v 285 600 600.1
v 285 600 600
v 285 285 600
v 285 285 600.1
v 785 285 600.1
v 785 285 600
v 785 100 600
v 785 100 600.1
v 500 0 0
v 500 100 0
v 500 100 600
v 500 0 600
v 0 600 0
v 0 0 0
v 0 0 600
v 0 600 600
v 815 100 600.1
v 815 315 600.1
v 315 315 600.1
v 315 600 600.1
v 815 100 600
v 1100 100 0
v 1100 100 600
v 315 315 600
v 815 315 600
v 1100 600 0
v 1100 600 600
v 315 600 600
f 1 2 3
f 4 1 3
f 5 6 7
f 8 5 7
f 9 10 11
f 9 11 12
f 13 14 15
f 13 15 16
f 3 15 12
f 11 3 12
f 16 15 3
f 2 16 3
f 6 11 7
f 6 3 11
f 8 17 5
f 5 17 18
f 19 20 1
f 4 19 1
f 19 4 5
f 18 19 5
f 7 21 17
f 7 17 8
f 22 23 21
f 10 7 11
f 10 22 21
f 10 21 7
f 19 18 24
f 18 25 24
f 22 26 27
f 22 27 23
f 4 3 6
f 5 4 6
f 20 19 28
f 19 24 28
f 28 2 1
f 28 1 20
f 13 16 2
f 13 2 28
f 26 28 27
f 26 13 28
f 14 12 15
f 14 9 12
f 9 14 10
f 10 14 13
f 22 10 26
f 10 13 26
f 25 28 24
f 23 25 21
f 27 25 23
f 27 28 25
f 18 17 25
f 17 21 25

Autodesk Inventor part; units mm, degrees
ref_plane "YZ Plane" through (0, 0, 0) normal (1, 0, 0) x (0, 1, 0)
ref_plane "XZ Plane" through (0, 0, 0) normal (0, 1, 0) x (-1, 0, 0)
ref_plane "XY Plane" through (0, 0, 0) normal (0, 0, 1) x (1, 0, 0)
sketch "スケッチ1" plane through (0, 0, 0) normal (0, 0, 1) x (1, 0, 0)
  line L0 (0, 0) -> (0, 600)
  line L1 (0, 600) -> (1100, 600)
  line L2 (1100, 600) -> (1100, 100)
  line L3 (1100, 100) -> (500, 100)
  line L4 (500, 100) -> (500, 0)
  line L5 (500, 0) -> (0, 0)
  line L6 (285, 600) -> (315, 600)
  line L7 (315, 600) -> (315, 285)
  line L8 (315, 285) -> (285, 285)
  line L9 (285, 285) -> (285, 600)
  line L10 (285, 285) -> (815, 285)
  line L11 (815, 285) -> (815, 315)
  line L12 (815, 315) -> (285, 315)
  line L13 (285, 315) -> (285, 285)
  line L14 (785, 100) -> (815, 100)
  line L15 (815, 100) -> (815, 315)
  line L16 (815, 315) -> (785, 315)
  line L17 (785, 315) -> (785, 100)
  point P0 (285, 300)
  point P1 (0, 300)
  point P2 (800, 100)
  point P3 (800, 100)
  dimension "d0" = 600
  dimension "d1" = 1100
  dimension "d2" = 500
  dimension "d3" = 600
  dimension "d4" = 100
  dimension "d5" = 30
  dimension "d6" = 285
extrude "押し出し1" add sketch "スケッチ1" along normal blind 600 contours L0 L1 L9 L8 L10 L17 L3 L4 L5 | L1 L2 L3 L15 L11 L12 L7
sketch "スケッチ2" plane through (0, 0, 0) normal (0, 0, -1) x (-1, 0, 0)
  line L0 (-285, 285) -> (-785, 285) projected
  line L1 (-785, 285) -> (-785, 100) projected
  line L2 (-285, 600) -> (-285, 285) projected
  line L3 (-815, 315) -> (-315, 315) projected
  line L4 (-315, 315) -> (-315, 600) projected
  line L5 (-1100, 600) -> (-315, 600) projected
  line L6 (-1100, 100) -> (-1100, 600) projected
  line L7 (-815, 100) -> (-1100, 100) projected
  line L8 (-815, 100) -> (-815, 315) projected
  line L9 (-285, 600) -> (-315, 600)
  line L10 (-785, 100) -> (-815, 100)
extrude "押し出し2" add sketch "スケッチ2" against normal blind 600.1 contours L0 L1 L10 L8 L3 L4 L9 L2
sketch "スケッチ3" plane through (0, 0, 600.1) normal (0, 0, 1) x (1, 0, 0)
  line L0 (285, 600) -> (285, 285) projected
  line L1 (285, 285) -> (785, 285) projected
  line L2 (815, 100) -> (815, 315) projected
  line L3 (815, 315) -> (315, 315) projected
  point P0 (0, 0)
  point P1 (800, 300)
  point P2 (300, 300)
  point P3 (300, 500)
  point P4 (600, 298.5149)
  dimension "d11" = 15
  dimension "d12" = 15
  dimension "d13" = 15
  dimension "d14" = 15
  dimension "d15" = 200
  dimension "d16" = 200
equation "\"d12\" = d11"
equation "\"d14\" = d13"
properties part number "River 2_赤"
